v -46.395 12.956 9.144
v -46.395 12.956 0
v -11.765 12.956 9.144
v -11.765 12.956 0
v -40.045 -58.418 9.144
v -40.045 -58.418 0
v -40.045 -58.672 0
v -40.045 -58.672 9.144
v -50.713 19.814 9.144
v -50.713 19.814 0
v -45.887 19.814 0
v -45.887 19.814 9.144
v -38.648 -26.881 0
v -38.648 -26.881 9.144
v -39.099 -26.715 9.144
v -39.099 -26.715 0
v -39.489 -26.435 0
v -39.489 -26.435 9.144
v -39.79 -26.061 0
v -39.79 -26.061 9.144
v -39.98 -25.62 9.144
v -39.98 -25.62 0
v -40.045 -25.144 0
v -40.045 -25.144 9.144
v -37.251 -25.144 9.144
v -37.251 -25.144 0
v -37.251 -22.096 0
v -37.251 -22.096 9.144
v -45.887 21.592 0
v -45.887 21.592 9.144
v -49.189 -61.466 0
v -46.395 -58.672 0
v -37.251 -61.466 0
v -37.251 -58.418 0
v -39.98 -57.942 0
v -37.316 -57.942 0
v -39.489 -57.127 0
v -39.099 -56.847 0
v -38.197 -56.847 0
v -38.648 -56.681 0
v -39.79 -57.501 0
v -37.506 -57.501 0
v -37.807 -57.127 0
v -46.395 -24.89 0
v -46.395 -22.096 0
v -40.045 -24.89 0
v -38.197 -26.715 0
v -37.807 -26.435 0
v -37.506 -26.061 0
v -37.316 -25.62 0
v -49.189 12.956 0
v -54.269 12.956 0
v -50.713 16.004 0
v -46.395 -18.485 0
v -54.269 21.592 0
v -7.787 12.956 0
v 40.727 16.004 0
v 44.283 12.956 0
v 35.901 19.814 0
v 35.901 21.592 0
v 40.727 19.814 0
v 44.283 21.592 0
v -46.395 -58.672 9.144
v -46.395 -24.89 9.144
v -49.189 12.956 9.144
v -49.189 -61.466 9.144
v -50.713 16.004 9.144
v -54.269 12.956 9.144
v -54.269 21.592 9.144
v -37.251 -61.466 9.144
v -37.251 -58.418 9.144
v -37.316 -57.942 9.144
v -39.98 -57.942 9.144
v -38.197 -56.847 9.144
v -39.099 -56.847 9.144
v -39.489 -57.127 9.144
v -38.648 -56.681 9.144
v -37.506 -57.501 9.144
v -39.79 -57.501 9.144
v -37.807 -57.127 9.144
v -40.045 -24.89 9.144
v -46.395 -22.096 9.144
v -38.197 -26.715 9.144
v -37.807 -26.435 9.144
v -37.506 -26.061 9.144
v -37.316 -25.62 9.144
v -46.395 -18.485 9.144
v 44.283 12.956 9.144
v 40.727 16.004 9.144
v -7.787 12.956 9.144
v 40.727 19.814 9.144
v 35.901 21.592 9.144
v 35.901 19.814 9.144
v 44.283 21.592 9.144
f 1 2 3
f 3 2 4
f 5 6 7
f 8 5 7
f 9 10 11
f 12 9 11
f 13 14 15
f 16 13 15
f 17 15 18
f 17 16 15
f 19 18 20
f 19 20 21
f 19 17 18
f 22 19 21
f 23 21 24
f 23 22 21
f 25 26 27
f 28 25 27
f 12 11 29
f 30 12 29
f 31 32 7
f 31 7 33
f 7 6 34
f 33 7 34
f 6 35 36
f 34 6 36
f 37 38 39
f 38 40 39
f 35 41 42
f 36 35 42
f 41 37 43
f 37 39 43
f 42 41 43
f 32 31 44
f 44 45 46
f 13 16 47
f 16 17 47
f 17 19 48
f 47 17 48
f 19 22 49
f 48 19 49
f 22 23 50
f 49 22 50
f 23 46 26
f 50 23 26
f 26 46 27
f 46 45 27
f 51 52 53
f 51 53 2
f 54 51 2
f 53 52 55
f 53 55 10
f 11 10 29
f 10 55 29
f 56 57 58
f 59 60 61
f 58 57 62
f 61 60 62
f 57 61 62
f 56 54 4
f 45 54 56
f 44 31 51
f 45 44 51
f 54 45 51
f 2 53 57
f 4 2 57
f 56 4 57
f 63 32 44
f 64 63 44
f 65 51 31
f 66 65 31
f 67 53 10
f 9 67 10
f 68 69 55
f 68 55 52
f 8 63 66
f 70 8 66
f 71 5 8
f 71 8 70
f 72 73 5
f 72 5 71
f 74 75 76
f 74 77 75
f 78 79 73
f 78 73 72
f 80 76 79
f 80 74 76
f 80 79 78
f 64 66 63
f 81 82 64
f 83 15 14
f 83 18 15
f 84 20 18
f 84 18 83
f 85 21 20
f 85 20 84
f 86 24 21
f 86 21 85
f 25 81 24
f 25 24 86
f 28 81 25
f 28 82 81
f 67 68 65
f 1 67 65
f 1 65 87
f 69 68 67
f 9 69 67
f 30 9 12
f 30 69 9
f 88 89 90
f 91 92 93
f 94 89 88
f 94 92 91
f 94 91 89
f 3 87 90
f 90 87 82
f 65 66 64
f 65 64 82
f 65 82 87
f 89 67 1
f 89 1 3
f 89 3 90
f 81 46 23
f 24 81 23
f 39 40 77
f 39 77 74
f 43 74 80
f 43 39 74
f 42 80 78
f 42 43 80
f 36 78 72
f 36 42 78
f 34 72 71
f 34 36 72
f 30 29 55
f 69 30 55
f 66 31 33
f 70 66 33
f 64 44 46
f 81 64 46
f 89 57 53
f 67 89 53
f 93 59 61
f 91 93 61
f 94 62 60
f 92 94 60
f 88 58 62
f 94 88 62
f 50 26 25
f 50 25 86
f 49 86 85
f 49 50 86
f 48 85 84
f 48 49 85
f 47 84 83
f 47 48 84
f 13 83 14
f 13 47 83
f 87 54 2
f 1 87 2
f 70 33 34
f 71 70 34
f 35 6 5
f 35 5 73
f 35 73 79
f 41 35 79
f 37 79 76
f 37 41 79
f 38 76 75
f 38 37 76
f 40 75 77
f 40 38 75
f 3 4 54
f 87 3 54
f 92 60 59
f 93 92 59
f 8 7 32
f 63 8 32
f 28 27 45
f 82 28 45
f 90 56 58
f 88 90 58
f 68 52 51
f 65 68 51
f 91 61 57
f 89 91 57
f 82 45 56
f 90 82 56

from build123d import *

# Parameters (mm, degrees)
F1_DEPTH    = 9.144
F2_T1_DEPTH = 18.034


# Not quite as in the source:
# - a fillet or chamfer that OpenCascade refuses, or shapes differently, is made with other operations: its cross-section is extruded or revolved along the edge and cut away or added


with BuildPart() as f1:
    # F0 (on Top) → F1 (new body)
    with BuildSketch(Plane.XY):
        Polygon((-45.8869487338, 19.8141042413), (-45.8869487338, 21.5921042413), (-54.2689487338, 21.5921042413), (-54.2689487338, 12.9561042413), (-49.1889487338, 12.9561042413), (-49.1889487338, -61.4658957587), (-37.2509487338, -61.4658957587), (-37.2509487338, -56.6398957587), (-40.0449487338, -56.6398957587), (-40.0449487338, -58.6718957587), (-46.3949487338, -58.6718957587), (-46.3949487338, -37.378154695), (-46.3949487338, -27.9378957587), (-46.3949487338, -24.8898957587), (-40.0449487338, -24.8898957587), (-40.0449487338, -26.9218957587), (-37.2509487338, -26.9218957587), (-37.2509487338, -22.0958957587), (-46.3949487338, -22.0958957587), (-7.7869487338, 12.9561042413), (44.2830512662, 12.9561042413), (44.2830512662, 21.5921042413), (35.9010512662, 21.5921042413), (35.9010512662, 19.8141042413), (40.7270512662, 19.8141042413), (40.7270512662, 16.0041042413), (-50.7129487338, 16.0041042413), (-50.7129487338, 19.8141042413), align=None)
        Polygon((-11.7646907362, 12.9561042413), (-46.3949487338, -18.4845247302), (-46.3949487338, 12.9561042413), align=None, mode=Mode.SUBTRACT)
    extrude(amount=F1_DEPTH)

    # F2: fillet of radius 1.778 on 4 edges, made by hand

    # F2_s2 → F2_t1 (cut)
    with BuildSketch(Plane.XY.offset(-4.445)):
        with BuildLine():
            ThreePointArc((-38.2669487338, -26.9218957587), (-39.5241845908, -26.4011316156), (-40.0449487338, -25.1438957587))
            Line((-40.0449487338, -25.1438957587), (-40.0449487338, -26.9218957587))
            Line((-40.0449487338, -26.9218957587), (-38.2669487338, -26.9218957587))
        make_face()
        with BuildLine():
            ThreePointArc((-37.2509487338, -25.1438957587), (-37.7717128769, -26.4011316156), (-39.0289487338, -26.9218957587))
            Line((-39.0289487338, -26.9218957587), (-37.2509487338, -26.9218957587))
            Line((-37.2509487338, -26.9218957587), (-37.2509487338, -25.1438957587))
        make_face()
        with BuildLine():
            ThreePointArc((-39.0289487338, -56.6398957587), (-37.7717128769, -57.1606599017), (-37.2509487338, -58.4178957587))
            Line((-37.2509487338, -58.4178957587), (-37.2509487338, -56.6398957587))
            Line((-37.2509487338, -56.6398957587), (-39.0289487338, -56.6398957587))
        make_face()
        with BuildLine():
            ThreePointArc((-40.0449487338, -58.4178957587), (-39.5241845908, -57.1606599017), (-38.2669487338, -56.6398957587))
            Line((-38.2669487338, -56.6398957587), (-40.0449487338, -56.6398957587))
            Line((-40.0449487338, -56.6398957587), (-40.0449487338, -58.4178957587))
        make_face()
    extrude(amount=F2_T1_DEPTH, mode=Mode.SUBTRACT)


solid = f1.part
